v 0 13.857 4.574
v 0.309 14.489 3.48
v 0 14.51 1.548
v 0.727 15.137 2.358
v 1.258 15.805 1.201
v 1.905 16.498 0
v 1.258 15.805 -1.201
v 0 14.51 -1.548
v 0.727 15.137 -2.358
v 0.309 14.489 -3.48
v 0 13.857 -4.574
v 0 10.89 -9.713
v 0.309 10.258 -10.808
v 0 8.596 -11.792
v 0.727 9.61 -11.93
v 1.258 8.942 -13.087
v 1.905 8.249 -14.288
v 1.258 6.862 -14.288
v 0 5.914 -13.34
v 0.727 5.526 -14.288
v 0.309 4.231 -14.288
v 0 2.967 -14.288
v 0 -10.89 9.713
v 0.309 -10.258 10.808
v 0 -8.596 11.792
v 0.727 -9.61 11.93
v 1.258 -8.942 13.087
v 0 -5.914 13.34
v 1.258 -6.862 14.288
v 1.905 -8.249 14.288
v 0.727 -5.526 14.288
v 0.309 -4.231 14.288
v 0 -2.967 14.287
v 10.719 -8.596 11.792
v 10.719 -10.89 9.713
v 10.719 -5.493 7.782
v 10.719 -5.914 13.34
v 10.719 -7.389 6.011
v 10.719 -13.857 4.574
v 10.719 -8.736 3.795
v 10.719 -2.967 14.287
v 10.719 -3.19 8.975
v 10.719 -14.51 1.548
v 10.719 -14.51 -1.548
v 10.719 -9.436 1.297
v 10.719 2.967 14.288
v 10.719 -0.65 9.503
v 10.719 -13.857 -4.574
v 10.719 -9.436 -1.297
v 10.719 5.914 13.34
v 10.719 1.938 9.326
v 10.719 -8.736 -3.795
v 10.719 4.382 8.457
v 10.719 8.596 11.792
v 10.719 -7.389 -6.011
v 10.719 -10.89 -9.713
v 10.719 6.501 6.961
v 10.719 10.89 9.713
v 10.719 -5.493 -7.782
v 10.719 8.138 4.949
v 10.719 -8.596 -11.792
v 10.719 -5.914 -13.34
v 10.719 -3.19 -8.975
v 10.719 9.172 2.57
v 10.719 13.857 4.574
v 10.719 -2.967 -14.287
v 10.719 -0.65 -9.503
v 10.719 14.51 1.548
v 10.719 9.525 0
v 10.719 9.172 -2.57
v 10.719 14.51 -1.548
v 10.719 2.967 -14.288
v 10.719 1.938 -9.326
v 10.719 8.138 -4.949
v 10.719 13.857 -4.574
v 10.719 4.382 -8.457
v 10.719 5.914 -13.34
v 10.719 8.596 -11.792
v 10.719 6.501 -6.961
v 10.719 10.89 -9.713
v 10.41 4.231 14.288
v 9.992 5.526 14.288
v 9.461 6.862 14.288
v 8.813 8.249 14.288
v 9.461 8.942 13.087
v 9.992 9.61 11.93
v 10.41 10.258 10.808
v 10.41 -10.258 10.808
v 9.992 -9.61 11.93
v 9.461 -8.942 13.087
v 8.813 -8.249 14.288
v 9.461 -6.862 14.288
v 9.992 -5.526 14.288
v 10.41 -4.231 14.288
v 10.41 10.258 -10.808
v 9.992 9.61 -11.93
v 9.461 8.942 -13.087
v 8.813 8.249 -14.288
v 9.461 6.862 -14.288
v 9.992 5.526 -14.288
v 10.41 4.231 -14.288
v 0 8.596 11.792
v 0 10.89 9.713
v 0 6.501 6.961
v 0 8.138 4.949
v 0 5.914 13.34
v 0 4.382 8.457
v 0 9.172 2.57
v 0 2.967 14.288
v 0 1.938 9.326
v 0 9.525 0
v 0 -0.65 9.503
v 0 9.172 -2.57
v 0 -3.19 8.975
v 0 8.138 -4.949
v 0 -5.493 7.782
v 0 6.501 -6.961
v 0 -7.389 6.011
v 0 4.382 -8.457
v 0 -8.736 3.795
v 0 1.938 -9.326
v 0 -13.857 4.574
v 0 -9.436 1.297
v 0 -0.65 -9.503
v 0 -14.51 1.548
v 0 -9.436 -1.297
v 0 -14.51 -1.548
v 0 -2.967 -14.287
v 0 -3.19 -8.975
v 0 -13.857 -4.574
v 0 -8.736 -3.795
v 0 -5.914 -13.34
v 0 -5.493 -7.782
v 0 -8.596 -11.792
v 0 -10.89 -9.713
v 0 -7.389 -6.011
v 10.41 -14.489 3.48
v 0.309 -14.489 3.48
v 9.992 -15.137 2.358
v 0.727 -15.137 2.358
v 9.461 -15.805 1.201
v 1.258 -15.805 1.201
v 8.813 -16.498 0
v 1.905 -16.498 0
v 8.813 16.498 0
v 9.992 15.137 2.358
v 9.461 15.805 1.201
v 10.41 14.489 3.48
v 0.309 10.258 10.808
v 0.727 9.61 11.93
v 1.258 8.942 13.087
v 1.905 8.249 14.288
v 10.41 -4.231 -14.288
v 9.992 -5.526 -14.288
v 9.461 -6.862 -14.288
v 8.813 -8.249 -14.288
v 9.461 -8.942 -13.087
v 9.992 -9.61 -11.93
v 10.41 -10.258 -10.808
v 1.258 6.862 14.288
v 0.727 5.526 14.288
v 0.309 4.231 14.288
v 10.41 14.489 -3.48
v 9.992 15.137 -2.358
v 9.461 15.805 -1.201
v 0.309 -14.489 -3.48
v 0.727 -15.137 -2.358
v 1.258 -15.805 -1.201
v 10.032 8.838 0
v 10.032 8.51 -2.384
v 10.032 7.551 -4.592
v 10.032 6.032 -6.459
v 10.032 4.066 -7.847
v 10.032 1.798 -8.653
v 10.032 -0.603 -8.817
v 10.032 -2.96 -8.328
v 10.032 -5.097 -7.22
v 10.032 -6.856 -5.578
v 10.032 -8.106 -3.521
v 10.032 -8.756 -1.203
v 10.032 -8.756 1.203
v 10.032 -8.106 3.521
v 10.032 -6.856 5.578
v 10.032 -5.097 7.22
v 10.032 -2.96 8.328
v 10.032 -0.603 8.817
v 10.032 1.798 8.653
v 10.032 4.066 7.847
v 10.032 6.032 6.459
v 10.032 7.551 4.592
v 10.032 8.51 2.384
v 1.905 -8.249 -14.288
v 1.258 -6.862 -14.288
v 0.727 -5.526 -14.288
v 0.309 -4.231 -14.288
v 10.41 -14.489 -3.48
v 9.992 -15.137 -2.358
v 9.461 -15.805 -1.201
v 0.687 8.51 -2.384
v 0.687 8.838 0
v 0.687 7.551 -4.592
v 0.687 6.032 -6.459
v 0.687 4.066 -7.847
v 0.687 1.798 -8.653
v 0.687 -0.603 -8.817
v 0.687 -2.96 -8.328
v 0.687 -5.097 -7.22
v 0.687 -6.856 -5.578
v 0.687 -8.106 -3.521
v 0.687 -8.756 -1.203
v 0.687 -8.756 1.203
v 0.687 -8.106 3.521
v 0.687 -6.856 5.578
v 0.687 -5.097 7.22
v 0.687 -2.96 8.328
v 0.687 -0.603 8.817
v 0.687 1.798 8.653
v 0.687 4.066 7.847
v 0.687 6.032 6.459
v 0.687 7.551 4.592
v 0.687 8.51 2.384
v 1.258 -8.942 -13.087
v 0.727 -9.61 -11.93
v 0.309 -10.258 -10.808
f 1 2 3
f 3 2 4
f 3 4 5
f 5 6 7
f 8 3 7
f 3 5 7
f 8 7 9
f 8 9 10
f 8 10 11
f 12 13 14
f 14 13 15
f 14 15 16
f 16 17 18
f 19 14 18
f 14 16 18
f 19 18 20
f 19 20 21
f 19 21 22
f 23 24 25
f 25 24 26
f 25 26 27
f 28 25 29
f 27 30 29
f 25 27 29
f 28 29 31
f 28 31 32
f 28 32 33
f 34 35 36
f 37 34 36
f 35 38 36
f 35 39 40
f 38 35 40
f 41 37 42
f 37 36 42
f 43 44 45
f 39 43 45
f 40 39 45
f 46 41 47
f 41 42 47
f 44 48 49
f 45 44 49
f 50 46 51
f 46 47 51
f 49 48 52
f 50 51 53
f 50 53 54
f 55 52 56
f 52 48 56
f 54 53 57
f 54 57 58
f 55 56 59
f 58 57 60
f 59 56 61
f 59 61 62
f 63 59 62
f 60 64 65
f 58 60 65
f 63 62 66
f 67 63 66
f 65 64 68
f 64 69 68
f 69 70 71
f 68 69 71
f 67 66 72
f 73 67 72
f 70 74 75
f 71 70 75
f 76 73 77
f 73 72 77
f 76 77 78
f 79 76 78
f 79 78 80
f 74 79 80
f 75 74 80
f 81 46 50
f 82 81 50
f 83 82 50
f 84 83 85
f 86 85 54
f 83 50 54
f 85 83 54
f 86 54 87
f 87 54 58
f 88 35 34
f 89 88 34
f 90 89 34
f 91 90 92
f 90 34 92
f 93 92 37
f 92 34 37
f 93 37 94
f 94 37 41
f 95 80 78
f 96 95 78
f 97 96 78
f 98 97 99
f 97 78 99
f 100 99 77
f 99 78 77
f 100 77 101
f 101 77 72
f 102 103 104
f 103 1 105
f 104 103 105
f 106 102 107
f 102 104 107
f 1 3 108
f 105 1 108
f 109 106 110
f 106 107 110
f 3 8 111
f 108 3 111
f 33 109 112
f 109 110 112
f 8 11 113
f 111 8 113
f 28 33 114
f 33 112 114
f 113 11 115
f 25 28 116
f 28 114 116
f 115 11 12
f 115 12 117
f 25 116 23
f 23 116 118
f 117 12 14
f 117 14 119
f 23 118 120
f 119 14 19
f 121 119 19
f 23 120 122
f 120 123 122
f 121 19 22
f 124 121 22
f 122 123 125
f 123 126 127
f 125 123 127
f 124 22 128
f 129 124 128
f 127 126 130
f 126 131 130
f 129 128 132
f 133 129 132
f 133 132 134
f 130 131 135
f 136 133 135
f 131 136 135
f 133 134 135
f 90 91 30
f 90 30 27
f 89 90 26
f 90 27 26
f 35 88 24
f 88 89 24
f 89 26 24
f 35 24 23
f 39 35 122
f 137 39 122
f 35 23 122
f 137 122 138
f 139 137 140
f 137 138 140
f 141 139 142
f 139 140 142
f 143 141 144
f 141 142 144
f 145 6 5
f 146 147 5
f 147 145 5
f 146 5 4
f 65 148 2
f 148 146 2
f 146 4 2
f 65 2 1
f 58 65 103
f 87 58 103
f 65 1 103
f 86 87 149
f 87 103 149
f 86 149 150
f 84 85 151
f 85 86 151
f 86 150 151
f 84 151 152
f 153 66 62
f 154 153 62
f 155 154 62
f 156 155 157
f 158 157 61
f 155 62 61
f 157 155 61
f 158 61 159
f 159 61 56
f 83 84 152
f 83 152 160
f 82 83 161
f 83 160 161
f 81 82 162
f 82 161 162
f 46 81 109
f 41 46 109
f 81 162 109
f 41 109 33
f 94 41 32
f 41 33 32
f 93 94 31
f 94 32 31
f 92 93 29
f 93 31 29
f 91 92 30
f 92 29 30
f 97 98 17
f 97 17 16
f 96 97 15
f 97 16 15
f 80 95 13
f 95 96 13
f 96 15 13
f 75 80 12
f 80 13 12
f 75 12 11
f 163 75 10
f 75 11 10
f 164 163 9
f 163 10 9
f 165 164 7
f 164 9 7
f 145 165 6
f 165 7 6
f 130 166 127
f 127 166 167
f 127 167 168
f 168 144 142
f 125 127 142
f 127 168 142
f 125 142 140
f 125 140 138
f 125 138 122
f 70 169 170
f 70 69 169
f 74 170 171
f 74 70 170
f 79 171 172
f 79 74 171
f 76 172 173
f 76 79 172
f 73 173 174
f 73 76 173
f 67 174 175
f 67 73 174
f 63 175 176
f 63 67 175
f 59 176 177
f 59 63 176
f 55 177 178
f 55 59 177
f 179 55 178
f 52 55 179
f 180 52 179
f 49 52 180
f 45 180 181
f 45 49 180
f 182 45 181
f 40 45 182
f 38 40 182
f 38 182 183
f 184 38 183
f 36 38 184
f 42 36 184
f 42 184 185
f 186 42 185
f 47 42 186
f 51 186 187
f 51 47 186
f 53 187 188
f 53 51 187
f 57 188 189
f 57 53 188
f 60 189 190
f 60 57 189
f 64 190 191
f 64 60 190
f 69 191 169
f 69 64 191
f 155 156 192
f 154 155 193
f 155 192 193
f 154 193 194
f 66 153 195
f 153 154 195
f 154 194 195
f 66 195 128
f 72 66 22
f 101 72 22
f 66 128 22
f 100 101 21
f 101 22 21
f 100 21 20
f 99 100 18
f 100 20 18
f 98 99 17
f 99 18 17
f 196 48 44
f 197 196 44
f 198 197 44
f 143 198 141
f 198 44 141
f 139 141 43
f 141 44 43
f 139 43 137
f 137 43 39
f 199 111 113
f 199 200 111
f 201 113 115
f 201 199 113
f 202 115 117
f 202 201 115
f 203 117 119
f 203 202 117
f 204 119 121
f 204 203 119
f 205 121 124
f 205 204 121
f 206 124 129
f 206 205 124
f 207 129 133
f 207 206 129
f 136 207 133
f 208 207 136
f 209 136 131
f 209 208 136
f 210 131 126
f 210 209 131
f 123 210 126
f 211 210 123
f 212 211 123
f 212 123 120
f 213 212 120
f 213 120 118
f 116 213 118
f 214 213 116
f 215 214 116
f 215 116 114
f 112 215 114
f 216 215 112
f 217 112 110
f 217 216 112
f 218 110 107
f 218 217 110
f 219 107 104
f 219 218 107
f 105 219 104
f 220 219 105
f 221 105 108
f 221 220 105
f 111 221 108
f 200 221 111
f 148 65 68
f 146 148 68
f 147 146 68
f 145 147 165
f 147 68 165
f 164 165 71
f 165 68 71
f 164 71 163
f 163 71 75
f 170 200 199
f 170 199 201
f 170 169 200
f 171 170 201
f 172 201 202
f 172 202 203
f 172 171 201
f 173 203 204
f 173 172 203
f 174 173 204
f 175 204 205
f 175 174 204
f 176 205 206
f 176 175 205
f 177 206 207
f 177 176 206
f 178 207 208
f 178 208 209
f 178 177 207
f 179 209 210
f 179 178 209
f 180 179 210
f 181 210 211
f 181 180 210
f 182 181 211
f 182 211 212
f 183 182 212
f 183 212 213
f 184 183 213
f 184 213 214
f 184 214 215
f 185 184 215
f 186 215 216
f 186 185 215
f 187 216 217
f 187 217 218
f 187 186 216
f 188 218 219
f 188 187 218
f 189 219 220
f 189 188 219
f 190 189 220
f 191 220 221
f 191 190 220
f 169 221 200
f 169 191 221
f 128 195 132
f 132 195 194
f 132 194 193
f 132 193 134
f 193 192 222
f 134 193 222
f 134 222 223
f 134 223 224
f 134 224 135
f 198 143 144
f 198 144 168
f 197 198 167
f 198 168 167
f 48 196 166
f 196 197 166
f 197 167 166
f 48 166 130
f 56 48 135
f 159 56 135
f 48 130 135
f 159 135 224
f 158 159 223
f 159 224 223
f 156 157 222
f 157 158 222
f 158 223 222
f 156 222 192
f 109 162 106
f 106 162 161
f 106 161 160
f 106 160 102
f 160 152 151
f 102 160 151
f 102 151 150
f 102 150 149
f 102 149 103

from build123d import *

# Parameters (mm, degrees)
ESBO_O2_R             = 28.575
CORTE_EXTRUS_O1_DEPTH = 10.7188


with BuildPart() as part:
    # Esboço1 → Revolução1 (revolve)
    with BuildSketch(Plane.XY):
        Polygon((0, 0), (0, 14.5923), (3.175, 17.7673), (7.5438, 17.7673), (10.7188, 14.5923), (10.7188, 0), align=None)
    revolve(axis=Axis((10.7188, 0, 0), (-1, 0, 0)))

    # Esboço2 → Corte-extrusão1 (cut)
    with BuildSketch(Plane(origin=(0, 0, 0), x_dir=(0, 0, -1), z_dir=(1, 0, 0))):
        Circle(ESBO_O2_R)
        Polygon((-14.2875, -8.248891971), (0, -16.497783942), (14.2875, -8.248891971), (14.2875, 8.248891971), (0, 16.497783942), (-14.2875, 8.248891971), align=None, mode=Mode.SUBTRACT)
    extrude(amount=CORTE_EXTRUS_O1_DEPTH, mode=Mode.SUBTRACT)

    # Esboço3 → Corte-Revolução1 (revolve, cut)
    with BuildSketch(Plane.XY):
        Polygon((0, 0), (0, 9.525), (0.68707, 8.83793), (10.03173, 8.83793), (10.7188, 9.525), (10.7188, 0), align=None)
    revolve(axis=Axis((10.7188, 0, 0), (-1, 0, 0)), mode=Mode.SUBTRACT)


solid = part.part
